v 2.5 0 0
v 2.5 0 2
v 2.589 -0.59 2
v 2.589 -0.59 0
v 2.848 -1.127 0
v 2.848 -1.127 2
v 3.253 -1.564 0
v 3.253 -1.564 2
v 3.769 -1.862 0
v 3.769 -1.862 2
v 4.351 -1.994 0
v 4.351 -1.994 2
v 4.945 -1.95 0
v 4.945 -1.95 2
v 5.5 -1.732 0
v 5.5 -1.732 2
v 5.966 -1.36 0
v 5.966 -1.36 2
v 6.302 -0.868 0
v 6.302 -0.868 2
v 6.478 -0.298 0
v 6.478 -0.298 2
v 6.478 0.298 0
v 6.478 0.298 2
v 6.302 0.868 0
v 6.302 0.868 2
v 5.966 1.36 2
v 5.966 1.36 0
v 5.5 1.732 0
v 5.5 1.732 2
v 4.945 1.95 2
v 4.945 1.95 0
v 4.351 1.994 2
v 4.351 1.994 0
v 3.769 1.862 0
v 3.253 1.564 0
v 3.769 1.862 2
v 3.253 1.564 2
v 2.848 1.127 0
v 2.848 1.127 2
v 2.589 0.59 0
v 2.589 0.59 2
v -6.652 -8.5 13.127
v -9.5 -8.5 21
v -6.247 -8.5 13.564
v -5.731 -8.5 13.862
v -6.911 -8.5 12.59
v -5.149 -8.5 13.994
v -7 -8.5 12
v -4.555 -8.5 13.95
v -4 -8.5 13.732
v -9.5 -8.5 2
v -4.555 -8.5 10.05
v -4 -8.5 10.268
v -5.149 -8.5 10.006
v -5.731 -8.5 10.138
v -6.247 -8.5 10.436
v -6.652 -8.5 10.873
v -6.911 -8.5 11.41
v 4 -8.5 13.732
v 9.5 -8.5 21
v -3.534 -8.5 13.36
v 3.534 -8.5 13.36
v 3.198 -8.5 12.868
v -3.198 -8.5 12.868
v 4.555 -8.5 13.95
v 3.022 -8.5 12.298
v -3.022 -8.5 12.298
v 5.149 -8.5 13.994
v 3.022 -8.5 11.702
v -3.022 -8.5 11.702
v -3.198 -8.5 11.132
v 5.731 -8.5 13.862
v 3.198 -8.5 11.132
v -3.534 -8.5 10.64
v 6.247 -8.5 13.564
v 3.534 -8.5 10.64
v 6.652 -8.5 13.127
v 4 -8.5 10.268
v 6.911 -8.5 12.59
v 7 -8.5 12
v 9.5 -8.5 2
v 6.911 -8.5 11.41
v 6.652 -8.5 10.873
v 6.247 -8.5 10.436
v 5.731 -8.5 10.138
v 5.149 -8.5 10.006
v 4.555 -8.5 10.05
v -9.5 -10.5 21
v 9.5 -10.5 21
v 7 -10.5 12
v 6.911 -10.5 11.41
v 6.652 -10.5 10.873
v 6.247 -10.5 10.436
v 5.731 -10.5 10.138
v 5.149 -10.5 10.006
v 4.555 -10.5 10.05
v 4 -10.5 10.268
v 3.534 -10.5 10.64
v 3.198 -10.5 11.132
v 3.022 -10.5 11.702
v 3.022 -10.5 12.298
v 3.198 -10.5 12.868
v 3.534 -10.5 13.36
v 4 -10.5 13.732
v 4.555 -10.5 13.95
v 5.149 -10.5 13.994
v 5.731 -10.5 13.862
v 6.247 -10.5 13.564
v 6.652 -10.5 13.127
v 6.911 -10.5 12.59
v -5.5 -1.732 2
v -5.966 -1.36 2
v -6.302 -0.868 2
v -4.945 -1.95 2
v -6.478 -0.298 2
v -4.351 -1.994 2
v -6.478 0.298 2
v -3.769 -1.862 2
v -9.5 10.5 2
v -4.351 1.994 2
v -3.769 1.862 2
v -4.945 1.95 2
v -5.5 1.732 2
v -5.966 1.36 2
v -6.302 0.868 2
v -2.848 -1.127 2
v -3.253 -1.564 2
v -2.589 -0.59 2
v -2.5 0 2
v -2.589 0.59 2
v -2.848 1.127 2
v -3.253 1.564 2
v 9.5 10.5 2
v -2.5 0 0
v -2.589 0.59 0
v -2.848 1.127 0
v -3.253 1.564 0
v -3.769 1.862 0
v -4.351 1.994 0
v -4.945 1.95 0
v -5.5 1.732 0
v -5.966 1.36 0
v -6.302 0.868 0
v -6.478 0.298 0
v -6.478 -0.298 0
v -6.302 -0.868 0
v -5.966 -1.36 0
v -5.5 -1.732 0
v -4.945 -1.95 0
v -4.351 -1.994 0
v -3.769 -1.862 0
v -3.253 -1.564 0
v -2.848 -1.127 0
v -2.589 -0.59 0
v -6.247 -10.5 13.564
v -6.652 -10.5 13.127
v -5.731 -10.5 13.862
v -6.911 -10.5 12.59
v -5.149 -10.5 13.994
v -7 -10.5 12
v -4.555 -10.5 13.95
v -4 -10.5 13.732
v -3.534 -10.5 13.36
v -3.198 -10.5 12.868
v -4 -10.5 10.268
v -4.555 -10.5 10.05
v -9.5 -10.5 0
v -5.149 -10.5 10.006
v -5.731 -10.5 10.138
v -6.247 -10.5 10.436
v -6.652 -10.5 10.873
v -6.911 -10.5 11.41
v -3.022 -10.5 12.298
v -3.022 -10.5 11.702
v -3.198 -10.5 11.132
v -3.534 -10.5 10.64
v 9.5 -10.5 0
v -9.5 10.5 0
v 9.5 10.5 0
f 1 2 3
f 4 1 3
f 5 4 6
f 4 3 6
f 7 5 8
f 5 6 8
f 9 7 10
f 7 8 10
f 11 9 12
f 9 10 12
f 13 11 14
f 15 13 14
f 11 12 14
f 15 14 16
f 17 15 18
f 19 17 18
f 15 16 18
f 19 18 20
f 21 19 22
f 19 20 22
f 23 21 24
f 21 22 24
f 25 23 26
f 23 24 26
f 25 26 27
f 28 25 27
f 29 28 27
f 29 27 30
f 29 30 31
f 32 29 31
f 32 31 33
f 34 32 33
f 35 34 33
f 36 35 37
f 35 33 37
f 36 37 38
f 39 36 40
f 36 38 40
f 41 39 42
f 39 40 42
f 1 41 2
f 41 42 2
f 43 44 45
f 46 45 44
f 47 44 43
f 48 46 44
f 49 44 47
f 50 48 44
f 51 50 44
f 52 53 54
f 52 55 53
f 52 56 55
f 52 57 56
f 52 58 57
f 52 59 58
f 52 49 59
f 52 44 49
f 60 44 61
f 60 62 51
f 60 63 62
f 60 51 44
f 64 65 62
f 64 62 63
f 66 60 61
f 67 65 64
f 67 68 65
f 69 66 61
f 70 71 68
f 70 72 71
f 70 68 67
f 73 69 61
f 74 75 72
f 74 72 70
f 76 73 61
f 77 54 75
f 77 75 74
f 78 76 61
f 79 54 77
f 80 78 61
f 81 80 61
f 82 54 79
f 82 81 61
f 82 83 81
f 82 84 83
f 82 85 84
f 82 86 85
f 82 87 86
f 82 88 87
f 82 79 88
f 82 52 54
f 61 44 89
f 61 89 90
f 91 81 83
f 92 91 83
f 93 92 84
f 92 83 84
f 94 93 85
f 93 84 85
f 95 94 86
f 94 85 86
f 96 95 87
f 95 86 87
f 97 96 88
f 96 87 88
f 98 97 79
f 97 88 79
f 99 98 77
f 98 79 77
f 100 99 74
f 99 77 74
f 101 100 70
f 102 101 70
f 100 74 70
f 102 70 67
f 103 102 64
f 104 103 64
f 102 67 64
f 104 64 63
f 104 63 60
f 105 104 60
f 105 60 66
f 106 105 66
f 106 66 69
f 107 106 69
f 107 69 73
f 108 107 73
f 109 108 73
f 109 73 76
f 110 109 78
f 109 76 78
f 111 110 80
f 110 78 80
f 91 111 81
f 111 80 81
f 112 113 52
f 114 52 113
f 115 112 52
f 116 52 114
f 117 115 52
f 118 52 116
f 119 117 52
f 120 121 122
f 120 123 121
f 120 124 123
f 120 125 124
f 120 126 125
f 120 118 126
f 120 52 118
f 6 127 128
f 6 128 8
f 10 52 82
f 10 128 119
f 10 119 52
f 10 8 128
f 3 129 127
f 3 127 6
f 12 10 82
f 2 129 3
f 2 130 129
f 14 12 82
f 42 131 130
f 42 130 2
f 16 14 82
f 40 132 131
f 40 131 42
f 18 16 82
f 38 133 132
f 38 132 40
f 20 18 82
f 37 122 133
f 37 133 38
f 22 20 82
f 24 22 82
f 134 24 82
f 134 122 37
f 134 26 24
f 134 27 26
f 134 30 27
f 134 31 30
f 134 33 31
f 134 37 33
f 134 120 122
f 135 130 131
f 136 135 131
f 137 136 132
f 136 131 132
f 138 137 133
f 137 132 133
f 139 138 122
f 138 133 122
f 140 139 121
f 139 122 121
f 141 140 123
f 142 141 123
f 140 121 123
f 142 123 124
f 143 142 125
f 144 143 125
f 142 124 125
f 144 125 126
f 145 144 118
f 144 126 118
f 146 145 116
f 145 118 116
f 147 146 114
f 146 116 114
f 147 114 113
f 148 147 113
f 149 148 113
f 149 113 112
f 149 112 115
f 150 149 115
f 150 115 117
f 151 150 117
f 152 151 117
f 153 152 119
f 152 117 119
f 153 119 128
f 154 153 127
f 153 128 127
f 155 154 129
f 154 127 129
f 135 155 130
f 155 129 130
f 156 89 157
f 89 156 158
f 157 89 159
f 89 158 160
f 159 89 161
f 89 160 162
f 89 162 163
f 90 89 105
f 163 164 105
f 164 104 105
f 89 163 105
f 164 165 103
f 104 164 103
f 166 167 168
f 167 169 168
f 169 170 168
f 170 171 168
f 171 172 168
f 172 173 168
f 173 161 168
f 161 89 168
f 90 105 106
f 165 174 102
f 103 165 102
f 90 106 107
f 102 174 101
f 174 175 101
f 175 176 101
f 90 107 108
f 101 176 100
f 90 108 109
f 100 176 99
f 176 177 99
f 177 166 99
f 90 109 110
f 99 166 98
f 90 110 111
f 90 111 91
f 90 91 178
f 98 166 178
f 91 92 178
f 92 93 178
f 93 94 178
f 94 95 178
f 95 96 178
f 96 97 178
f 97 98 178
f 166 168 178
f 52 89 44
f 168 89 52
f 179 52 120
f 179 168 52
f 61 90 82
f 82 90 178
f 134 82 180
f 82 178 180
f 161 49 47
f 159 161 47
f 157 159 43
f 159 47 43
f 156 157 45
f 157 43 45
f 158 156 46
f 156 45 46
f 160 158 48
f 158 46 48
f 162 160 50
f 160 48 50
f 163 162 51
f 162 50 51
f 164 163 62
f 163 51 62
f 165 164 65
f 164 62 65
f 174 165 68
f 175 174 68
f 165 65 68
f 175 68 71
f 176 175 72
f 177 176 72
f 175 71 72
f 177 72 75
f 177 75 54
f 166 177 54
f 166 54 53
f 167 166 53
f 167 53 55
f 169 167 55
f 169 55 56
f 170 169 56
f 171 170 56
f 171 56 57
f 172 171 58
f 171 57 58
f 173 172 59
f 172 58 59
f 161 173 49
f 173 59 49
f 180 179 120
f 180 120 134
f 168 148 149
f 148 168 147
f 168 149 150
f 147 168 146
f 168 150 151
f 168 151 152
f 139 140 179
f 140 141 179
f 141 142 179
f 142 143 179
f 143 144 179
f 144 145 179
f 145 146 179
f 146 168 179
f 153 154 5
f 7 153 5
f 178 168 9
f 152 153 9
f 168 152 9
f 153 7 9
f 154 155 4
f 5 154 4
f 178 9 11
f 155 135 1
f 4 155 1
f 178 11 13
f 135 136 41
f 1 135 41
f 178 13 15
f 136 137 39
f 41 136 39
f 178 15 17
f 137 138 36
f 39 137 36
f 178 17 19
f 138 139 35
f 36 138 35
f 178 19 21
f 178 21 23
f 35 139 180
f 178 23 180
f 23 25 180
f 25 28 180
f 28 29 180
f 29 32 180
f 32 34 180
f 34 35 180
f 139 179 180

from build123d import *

# Parameters (mm, degrees)
SKETCH1_W           = 19
SKETCH1_H           = 21
BOSS_EXTRUDE1_DEPTH = 2
SKETCH3_W           = 19
SKETCH3_H           = 2
BOSS_EXTRUDE3_DEPTH = 19
SKETCH6_R           = 2
CUT_EXTRUDE1_DEPTH  = 2
SKETCH7_R           = 2
CUT_EXTRUDE2_DEPTH  = 2


with BuildPart() as part:
    # Sketch1 → Boss-Extrude1 (new body)
    with BuildSketch(Plane.XY):
        Rectangle(SKETCH1_W, SKETCH1_H)
    extrude(amount=BOSS_EXTRUDE1_DEPTH)

    # Sketch3 → Boss-Extrude3 (add)
    with BuildSketch(Plane.XY.offset(2)):
        with Locations((0, -9.5)):
            Rectangle(SKETCH3_W, SKETCH3_H)
    extrude(amount=BOSS_EXTRUDE3_DEPTH)

    # Sketch6 → Cut-Extrude1 (cut)
    with BuildSketch(Plane.XY.offset(2)):
        with Locations((-4.5, 0)):
            Circle(SKETCH6_R)
        with Locations(Location((4.5, 0, 0), (0, 0, 180))):
            Circle(SKETCH6_R)
    extrude(amount=-CUT_EXTRUDE1_DEPTH, mode=Mode.SUBTRACT)

    # Sketch7 → Cut-Extrude2 (cut)
    with BuildSketch(Plane(origin=(0, -8.5, 0), x_dir=(1, 0, 0), z_dir=(0, 1, 0))):
        with Locations(Location((-5, -12, 0), (0, 0, 180))):
            Circle(SKETCH7_R)
        with Locations((5, -12)):
            Circle(SKETCH7_R)
    extrude(amount=-CUT_EXTRUDE2_DEPTH, mode=Mode.SUBTRACT)


solid = part.part
